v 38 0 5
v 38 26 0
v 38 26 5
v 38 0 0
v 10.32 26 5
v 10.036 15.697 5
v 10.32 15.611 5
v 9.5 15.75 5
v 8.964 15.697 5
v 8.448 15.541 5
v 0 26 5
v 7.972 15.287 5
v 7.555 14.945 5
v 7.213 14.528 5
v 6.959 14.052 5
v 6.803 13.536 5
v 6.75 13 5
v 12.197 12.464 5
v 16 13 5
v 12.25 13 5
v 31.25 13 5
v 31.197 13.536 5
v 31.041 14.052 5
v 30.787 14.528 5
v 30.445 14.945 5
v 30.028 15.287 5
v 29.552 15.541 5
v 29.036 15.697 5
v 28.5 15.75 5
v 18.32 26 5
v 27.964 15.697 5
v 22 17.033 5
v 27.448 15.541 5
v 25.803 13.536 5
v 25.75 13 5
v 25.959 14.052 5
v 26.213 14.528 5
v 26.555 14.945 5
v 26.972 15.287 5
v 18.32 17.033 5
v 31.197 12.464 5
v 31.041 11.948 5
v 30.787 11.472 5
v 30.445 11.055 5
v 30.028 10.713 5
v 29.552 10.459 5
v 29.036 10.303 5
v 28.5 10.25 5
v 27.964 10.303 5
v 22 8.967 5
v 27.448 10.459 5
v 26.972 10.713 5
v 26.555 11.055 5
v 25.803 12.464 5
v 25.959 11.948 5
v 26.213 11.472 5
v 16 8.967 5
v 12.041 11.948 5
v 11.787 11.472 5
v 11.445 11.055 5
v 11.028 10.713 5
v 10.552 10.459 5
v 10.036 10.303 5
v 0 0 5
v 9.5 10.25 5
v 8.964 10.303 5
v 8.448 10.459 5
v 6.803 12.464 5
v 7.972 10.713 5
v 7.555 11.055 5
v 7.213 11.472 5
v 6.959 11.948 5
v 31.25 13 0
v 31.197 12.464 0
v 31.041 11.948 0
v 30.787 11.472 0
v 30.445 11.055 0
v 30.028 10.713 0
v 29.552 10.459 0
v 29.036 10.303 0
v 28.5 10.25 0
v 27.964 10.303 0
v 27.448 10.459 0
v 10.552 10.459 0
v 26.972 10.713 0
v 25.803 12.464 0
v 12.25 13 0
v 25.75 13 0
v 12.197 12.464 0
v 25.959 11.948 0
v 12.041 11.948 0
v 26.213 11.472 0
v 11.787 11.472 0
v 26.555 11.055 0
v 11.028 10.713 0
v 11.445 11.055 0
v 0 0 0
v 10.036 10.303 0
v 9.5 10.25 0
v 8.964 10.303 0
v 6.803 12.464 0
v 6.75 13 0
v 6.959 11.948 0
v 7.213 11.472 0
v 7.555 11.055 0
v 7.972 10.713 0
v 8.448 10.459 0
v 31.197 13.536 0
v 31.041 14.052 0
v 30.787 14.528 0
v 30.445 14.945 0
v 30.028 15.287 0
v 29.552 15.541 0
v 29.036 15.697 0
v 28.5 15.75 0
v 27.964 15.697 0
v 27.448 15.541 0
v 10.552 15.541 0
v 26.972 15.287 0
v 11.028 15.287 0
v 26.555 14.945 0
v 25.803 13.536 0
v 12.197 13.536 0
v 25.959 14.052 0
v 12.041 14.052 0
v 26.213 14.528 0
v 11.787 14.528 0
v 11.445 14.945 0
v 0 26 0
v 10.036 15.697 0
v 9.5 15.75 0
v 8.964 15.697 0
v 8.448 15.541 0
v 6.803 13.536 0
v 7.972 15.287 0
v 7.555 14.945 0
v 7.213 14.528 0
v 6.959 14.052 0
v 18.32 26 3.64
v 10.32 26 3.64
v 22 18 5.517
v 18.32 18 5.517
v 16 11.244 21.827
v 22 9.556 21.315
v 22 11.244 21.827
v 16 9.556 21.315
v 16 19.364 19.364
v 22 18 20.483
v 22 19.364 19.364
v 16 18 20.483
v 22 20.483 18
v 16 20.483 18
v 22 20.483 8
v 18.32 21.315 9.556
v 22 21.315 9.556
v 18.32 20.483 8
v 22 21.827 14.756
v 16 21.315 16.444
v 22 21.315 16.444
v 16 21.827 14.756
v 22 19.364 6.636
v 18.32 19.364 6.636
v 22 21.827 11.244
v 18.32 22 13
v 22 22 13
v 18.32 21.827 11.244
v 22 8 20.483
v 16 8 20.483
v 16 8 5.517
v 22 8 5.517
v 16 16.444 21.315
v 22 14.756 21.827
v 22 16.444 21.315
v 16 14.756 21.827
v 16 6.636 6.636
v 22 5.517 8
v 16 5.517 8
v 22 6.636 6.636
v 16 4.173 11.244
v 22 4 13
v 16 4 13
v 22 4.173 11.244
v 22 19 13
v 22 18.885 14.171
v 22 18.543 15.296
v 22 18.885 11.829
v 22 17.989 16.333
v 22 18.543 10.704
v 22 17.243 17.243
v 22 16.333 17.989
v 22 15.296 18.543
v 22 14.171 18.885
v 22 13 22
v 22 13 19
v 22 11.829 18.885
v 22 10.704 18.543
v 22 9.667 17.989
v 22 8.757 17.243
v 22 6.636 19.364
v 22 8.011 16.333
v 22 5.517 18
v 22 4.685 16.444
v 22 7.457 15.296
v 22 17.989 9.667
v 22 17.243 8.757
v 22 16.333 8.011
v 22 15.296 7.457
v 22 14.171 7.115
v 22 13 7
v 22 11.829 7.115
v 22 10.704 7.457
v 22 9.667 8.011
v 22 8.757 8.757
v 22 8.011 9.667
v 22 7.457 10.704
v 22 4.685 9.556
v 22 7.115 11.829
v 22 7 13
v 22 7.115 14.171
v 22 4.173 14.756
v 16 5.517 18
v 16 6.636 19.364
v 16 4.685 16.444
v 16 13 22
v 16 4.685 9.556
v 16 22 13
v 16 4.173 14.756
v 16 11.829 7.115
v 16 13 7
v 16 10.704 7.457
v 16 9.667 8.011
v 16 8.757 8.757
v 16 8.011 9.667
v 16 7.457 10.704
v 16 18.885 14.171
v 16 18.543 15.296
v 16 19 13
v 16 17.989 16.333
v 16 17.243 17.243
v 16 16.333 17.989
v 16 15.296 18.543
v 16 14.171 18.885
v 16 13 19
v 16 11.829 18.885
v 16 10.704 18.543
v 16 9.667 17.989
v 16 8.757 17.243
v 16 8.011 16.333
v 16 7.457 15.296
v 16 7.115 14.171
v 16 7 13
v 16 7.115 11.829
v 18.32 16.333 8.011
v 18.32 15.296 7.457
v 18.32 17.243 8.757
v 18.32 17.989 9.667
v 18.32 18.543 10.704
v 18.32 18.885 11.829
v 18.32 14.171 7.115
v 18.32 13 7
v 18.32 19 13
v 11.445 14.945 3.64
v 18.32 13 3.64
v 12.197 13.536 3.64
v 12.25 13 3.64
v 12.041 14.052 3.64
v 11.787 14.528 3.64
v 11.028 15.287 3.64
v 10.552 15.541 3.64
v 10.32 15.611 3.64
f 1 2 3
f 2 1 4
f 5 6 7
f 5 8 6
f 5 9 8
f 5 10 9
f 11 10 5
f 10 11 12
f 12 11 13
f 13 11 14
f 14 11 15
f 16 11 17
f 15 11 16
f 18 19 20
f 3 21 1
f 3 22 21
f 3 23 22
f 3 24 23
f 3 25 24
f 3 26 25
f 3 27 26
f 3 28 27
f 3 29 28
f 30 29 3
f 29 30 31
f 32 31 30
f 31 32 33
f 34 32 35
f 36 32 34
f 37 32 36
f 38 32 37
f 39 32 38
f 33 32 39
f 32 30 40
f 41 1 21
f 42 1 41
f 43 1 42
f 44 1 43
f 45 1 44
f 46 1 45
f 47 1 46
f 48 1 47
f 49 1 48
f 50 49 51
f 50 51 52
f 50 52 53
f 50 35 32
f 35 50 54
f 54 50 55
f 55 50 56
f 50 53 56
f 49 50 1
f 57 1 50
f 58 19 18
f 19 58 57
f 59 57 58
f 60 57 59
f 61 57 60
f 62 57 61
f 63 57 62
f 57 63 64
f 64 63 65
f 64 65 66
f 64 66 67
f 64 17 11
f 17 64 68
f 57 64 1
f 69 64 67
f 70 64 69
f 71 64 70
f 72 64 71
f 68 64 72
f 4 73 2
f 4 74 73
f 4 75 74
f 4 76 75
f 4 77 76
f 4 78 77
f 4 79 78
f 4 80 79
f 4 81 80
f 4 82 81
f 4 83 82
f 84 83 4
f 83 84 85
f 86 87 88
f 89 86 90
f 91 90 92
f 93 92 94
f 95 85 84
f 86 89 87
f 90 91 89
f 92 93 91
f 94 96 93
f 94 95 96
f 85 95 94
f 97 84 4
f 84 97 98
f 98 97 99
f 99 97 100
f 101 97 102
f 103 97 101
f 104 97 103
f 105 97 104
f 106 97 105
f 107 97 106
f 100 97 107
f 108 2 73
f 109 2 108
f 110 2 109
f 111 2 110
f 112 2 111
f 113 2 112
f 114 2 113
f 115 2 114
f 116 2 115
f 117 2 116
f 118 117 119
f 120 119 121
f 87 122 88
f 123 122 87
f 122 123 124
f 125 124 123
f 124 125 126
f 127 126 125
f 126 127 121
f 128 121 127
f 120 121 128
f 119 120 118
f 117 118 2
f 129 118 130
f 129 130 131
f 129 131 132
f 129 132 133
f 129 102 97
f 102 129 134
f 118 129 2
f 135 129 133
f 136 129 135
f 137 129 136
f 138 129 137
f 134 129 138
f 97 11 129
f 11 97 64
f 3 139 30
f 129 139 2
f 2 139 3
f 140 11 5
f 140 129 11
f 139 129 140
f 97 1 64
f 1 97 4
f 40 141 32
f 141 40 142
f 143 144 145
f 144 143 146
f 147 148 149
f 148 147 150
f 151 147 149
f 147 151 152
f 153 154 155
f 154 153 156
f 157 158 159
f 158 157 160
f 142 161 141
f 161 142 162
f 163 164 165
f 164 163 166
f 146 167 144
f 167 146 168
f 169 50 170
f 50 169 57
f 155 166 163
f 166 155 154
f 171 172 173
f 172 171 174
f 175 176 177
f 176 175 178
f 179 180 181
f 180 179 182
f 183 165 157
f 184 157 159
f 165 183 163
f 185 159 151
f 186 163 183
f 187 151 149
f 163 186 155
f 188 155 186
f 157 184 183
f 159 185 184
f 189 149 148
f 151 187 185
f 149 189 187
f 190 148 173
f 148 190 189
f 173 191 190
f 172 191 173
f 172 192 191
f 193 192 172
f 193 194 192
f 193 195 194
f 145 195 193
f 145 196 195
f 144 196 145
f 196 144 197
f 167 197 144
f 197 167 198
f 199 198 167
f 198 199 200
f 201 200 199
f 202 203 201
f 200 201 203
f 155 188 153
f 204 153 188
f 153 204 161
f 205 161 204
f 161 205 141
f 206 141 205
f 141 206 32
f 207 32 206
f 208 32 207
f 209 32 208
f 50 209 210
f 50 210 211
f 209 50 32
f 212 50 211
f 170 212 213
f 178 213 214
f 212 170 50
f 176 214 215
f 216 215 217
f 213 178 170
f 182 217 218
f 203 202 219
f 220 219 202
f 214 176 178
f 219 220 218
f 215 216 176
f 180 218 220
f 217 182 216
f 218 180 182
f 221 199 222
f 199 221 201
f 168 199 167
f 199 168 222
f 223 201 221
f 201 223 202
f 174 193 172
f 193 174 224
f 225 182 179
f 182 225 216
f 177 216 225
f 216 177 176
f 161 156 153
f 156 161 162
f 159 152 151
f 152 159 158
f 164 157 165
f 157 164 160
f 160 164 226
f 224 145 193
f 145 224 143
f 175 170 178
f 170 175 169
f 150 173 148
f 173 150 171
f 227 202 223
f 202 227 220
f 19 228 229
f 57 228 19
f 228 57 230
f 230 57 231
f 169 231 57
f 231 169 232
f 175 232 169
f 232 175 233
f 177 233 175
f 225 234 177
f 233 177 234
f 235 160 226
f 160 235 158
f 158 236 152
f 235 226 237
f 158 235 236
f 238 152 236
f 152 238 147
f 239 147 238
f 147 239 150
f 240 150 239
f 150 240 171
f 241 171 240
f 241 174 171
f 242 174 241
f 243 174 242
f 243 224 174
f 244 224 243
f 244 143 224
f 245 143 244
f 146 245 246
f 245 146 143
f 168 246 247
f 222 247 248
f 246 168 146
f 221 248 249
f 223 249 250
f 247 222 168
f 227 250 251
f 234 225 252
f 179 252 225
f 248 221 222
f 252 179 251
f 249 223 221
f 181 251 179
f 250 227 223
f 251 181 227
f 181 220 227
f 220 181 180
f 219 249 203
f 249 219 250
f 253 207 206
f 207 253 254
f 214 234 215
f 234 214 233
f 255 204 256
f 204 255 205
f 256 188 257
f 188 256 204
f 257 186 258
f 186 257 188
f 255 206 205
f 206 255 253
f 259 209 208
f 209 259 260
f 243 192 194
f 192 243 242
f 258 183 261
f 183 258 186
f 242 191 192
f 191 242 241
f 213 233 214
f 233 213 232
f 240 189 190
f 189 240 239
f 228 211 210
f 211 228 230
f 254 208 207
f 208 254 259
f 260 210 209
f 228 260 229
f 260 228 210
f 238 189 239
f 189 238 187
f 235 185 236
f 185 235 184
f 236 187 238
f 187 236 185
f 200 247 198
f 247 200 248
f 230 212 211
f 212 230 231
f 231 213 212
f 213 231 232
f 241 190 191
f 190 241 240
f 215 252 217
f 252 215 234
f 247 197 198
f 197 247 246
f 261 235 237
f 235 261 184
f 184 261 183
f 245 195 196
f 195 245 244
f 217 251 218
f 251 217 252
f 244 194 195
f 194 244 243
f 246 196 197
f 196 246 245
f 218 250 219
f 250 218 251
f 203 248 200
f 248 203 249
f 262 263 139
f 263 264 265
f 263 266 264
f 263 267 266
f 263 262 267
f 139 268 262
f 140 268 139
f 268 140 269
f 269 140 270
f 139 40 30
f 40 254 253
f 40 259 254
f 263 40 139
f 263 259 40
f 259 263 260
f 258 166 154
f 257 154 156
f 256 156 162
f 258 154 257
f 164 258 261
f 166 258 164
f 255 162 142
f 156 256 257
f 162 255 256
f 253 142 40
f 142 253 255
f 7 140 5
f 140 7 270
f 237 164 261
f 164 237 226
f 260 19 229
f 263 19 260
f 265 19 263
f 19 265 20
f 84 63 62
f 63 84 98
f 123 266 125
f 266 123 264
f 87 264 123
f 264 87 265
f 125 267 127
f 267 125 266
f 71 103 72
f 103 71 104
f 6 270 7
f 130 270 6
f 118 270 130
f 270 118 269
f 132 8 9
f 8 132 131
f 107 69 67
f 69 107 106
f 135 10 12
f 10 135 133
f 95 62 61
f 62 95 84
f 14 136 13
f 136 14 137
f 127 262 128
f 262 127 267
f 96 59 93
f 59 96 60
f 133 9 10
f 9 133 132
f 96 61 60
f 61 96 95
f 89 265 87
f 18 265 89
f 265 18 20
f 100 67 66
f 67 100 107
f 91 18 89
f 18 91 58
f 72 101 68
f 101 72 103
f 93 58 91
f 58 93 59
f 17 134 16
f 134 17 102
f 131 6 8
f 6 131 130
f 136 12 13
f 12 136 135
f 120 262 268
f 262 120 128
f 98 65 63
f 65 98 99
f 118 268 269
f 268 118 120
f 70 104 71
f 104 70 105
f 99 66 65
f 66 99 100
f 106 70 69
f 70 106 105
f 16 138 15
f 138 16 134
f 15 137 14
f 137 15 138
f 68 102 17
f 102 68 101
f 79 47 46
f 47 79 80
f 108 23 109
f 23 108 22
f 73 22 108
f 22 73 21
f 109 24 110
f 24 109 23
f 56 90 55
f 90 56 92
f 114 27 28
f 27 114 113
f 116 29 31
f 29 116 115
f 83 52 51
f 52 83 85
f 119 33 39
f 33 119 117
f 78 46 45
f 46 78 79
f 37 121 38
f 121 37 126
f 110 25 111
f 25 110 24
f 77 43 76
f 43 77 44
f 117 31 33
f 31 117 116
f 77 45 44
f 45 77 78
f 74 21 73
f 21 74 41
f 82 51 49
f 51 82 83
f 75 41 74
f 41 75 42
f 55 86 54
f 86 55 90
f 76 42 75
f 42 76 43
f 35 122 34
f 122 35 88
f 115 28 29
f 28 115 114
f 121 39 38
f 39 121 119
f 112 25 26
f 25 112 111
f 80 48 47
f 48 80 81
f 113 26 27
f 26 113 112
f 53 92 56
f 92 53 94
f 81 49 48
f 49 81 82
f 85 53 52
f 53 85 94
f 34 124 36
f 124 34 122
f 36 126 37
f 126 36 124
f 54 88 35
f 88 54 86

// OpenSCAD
$fn = 32;

// ----------------------------------------------------------------------
// Cable clip: cable 12 mm, clamp 18 mm, base 38 mm
// ----------------------------------------------------------------------

// --- parameters (mm) ---
foot_w = 38;              // base length, X
foot_d = 26;              // base width, Y
foot_t = 5;               // base thickness
hose_seat_d = 18;         // clamp outside diameter
ring_t = 3;               // clamp wall
cable_d = 12;             // cable opening
ring_w = 6;               // clamp width along the cable
screw_d = 5.5;            // screw clearance
throat = 9.36;            // snap throat width
sink = 1;                 // overlap of the clamp into the base

module base() {
  cube([foot_w, foot_d, foot_t]);
}

module clamp() {
  translate([foot_w / 2, foot_d / 2, foot_t + hose_seat_d / 2 - sink]) rotate([0, 90, 0])
    cylinder(h = ring_w, d = hose_seat_d, center = true);
}

difference() {
  union() {
    base();
    clamp();
  }
  translate([foot_w / 2, foot_d / 2, foot_t + hose_seat_d / 2 - sink]) rotate([0, 90, 0]) translate([0, 0, -ring_w / 2 - 1]) cylinder(h = ring_w + 2, d = cable_d);
  /* snap throat: the opening is narrower than the cable */
  translate([foot_w / 2 - throat / 2, foot_d / 2, foot_t + hose_seat_d / 2 - sink]) rotate([0, 90, 0]) translate([0, 0, -ring_w / 2 - 1]) cube([throat, hose_seat_d + 2, ring_w + 2]);
  translate([9.5, foot_d / 2, -1]) cylinder(h = foot_t + 2, d = screw_d);
  translate([28.5, foot_d / 2, -1]) cylinder(h = foot_t + 2, d = screw_d);
}
